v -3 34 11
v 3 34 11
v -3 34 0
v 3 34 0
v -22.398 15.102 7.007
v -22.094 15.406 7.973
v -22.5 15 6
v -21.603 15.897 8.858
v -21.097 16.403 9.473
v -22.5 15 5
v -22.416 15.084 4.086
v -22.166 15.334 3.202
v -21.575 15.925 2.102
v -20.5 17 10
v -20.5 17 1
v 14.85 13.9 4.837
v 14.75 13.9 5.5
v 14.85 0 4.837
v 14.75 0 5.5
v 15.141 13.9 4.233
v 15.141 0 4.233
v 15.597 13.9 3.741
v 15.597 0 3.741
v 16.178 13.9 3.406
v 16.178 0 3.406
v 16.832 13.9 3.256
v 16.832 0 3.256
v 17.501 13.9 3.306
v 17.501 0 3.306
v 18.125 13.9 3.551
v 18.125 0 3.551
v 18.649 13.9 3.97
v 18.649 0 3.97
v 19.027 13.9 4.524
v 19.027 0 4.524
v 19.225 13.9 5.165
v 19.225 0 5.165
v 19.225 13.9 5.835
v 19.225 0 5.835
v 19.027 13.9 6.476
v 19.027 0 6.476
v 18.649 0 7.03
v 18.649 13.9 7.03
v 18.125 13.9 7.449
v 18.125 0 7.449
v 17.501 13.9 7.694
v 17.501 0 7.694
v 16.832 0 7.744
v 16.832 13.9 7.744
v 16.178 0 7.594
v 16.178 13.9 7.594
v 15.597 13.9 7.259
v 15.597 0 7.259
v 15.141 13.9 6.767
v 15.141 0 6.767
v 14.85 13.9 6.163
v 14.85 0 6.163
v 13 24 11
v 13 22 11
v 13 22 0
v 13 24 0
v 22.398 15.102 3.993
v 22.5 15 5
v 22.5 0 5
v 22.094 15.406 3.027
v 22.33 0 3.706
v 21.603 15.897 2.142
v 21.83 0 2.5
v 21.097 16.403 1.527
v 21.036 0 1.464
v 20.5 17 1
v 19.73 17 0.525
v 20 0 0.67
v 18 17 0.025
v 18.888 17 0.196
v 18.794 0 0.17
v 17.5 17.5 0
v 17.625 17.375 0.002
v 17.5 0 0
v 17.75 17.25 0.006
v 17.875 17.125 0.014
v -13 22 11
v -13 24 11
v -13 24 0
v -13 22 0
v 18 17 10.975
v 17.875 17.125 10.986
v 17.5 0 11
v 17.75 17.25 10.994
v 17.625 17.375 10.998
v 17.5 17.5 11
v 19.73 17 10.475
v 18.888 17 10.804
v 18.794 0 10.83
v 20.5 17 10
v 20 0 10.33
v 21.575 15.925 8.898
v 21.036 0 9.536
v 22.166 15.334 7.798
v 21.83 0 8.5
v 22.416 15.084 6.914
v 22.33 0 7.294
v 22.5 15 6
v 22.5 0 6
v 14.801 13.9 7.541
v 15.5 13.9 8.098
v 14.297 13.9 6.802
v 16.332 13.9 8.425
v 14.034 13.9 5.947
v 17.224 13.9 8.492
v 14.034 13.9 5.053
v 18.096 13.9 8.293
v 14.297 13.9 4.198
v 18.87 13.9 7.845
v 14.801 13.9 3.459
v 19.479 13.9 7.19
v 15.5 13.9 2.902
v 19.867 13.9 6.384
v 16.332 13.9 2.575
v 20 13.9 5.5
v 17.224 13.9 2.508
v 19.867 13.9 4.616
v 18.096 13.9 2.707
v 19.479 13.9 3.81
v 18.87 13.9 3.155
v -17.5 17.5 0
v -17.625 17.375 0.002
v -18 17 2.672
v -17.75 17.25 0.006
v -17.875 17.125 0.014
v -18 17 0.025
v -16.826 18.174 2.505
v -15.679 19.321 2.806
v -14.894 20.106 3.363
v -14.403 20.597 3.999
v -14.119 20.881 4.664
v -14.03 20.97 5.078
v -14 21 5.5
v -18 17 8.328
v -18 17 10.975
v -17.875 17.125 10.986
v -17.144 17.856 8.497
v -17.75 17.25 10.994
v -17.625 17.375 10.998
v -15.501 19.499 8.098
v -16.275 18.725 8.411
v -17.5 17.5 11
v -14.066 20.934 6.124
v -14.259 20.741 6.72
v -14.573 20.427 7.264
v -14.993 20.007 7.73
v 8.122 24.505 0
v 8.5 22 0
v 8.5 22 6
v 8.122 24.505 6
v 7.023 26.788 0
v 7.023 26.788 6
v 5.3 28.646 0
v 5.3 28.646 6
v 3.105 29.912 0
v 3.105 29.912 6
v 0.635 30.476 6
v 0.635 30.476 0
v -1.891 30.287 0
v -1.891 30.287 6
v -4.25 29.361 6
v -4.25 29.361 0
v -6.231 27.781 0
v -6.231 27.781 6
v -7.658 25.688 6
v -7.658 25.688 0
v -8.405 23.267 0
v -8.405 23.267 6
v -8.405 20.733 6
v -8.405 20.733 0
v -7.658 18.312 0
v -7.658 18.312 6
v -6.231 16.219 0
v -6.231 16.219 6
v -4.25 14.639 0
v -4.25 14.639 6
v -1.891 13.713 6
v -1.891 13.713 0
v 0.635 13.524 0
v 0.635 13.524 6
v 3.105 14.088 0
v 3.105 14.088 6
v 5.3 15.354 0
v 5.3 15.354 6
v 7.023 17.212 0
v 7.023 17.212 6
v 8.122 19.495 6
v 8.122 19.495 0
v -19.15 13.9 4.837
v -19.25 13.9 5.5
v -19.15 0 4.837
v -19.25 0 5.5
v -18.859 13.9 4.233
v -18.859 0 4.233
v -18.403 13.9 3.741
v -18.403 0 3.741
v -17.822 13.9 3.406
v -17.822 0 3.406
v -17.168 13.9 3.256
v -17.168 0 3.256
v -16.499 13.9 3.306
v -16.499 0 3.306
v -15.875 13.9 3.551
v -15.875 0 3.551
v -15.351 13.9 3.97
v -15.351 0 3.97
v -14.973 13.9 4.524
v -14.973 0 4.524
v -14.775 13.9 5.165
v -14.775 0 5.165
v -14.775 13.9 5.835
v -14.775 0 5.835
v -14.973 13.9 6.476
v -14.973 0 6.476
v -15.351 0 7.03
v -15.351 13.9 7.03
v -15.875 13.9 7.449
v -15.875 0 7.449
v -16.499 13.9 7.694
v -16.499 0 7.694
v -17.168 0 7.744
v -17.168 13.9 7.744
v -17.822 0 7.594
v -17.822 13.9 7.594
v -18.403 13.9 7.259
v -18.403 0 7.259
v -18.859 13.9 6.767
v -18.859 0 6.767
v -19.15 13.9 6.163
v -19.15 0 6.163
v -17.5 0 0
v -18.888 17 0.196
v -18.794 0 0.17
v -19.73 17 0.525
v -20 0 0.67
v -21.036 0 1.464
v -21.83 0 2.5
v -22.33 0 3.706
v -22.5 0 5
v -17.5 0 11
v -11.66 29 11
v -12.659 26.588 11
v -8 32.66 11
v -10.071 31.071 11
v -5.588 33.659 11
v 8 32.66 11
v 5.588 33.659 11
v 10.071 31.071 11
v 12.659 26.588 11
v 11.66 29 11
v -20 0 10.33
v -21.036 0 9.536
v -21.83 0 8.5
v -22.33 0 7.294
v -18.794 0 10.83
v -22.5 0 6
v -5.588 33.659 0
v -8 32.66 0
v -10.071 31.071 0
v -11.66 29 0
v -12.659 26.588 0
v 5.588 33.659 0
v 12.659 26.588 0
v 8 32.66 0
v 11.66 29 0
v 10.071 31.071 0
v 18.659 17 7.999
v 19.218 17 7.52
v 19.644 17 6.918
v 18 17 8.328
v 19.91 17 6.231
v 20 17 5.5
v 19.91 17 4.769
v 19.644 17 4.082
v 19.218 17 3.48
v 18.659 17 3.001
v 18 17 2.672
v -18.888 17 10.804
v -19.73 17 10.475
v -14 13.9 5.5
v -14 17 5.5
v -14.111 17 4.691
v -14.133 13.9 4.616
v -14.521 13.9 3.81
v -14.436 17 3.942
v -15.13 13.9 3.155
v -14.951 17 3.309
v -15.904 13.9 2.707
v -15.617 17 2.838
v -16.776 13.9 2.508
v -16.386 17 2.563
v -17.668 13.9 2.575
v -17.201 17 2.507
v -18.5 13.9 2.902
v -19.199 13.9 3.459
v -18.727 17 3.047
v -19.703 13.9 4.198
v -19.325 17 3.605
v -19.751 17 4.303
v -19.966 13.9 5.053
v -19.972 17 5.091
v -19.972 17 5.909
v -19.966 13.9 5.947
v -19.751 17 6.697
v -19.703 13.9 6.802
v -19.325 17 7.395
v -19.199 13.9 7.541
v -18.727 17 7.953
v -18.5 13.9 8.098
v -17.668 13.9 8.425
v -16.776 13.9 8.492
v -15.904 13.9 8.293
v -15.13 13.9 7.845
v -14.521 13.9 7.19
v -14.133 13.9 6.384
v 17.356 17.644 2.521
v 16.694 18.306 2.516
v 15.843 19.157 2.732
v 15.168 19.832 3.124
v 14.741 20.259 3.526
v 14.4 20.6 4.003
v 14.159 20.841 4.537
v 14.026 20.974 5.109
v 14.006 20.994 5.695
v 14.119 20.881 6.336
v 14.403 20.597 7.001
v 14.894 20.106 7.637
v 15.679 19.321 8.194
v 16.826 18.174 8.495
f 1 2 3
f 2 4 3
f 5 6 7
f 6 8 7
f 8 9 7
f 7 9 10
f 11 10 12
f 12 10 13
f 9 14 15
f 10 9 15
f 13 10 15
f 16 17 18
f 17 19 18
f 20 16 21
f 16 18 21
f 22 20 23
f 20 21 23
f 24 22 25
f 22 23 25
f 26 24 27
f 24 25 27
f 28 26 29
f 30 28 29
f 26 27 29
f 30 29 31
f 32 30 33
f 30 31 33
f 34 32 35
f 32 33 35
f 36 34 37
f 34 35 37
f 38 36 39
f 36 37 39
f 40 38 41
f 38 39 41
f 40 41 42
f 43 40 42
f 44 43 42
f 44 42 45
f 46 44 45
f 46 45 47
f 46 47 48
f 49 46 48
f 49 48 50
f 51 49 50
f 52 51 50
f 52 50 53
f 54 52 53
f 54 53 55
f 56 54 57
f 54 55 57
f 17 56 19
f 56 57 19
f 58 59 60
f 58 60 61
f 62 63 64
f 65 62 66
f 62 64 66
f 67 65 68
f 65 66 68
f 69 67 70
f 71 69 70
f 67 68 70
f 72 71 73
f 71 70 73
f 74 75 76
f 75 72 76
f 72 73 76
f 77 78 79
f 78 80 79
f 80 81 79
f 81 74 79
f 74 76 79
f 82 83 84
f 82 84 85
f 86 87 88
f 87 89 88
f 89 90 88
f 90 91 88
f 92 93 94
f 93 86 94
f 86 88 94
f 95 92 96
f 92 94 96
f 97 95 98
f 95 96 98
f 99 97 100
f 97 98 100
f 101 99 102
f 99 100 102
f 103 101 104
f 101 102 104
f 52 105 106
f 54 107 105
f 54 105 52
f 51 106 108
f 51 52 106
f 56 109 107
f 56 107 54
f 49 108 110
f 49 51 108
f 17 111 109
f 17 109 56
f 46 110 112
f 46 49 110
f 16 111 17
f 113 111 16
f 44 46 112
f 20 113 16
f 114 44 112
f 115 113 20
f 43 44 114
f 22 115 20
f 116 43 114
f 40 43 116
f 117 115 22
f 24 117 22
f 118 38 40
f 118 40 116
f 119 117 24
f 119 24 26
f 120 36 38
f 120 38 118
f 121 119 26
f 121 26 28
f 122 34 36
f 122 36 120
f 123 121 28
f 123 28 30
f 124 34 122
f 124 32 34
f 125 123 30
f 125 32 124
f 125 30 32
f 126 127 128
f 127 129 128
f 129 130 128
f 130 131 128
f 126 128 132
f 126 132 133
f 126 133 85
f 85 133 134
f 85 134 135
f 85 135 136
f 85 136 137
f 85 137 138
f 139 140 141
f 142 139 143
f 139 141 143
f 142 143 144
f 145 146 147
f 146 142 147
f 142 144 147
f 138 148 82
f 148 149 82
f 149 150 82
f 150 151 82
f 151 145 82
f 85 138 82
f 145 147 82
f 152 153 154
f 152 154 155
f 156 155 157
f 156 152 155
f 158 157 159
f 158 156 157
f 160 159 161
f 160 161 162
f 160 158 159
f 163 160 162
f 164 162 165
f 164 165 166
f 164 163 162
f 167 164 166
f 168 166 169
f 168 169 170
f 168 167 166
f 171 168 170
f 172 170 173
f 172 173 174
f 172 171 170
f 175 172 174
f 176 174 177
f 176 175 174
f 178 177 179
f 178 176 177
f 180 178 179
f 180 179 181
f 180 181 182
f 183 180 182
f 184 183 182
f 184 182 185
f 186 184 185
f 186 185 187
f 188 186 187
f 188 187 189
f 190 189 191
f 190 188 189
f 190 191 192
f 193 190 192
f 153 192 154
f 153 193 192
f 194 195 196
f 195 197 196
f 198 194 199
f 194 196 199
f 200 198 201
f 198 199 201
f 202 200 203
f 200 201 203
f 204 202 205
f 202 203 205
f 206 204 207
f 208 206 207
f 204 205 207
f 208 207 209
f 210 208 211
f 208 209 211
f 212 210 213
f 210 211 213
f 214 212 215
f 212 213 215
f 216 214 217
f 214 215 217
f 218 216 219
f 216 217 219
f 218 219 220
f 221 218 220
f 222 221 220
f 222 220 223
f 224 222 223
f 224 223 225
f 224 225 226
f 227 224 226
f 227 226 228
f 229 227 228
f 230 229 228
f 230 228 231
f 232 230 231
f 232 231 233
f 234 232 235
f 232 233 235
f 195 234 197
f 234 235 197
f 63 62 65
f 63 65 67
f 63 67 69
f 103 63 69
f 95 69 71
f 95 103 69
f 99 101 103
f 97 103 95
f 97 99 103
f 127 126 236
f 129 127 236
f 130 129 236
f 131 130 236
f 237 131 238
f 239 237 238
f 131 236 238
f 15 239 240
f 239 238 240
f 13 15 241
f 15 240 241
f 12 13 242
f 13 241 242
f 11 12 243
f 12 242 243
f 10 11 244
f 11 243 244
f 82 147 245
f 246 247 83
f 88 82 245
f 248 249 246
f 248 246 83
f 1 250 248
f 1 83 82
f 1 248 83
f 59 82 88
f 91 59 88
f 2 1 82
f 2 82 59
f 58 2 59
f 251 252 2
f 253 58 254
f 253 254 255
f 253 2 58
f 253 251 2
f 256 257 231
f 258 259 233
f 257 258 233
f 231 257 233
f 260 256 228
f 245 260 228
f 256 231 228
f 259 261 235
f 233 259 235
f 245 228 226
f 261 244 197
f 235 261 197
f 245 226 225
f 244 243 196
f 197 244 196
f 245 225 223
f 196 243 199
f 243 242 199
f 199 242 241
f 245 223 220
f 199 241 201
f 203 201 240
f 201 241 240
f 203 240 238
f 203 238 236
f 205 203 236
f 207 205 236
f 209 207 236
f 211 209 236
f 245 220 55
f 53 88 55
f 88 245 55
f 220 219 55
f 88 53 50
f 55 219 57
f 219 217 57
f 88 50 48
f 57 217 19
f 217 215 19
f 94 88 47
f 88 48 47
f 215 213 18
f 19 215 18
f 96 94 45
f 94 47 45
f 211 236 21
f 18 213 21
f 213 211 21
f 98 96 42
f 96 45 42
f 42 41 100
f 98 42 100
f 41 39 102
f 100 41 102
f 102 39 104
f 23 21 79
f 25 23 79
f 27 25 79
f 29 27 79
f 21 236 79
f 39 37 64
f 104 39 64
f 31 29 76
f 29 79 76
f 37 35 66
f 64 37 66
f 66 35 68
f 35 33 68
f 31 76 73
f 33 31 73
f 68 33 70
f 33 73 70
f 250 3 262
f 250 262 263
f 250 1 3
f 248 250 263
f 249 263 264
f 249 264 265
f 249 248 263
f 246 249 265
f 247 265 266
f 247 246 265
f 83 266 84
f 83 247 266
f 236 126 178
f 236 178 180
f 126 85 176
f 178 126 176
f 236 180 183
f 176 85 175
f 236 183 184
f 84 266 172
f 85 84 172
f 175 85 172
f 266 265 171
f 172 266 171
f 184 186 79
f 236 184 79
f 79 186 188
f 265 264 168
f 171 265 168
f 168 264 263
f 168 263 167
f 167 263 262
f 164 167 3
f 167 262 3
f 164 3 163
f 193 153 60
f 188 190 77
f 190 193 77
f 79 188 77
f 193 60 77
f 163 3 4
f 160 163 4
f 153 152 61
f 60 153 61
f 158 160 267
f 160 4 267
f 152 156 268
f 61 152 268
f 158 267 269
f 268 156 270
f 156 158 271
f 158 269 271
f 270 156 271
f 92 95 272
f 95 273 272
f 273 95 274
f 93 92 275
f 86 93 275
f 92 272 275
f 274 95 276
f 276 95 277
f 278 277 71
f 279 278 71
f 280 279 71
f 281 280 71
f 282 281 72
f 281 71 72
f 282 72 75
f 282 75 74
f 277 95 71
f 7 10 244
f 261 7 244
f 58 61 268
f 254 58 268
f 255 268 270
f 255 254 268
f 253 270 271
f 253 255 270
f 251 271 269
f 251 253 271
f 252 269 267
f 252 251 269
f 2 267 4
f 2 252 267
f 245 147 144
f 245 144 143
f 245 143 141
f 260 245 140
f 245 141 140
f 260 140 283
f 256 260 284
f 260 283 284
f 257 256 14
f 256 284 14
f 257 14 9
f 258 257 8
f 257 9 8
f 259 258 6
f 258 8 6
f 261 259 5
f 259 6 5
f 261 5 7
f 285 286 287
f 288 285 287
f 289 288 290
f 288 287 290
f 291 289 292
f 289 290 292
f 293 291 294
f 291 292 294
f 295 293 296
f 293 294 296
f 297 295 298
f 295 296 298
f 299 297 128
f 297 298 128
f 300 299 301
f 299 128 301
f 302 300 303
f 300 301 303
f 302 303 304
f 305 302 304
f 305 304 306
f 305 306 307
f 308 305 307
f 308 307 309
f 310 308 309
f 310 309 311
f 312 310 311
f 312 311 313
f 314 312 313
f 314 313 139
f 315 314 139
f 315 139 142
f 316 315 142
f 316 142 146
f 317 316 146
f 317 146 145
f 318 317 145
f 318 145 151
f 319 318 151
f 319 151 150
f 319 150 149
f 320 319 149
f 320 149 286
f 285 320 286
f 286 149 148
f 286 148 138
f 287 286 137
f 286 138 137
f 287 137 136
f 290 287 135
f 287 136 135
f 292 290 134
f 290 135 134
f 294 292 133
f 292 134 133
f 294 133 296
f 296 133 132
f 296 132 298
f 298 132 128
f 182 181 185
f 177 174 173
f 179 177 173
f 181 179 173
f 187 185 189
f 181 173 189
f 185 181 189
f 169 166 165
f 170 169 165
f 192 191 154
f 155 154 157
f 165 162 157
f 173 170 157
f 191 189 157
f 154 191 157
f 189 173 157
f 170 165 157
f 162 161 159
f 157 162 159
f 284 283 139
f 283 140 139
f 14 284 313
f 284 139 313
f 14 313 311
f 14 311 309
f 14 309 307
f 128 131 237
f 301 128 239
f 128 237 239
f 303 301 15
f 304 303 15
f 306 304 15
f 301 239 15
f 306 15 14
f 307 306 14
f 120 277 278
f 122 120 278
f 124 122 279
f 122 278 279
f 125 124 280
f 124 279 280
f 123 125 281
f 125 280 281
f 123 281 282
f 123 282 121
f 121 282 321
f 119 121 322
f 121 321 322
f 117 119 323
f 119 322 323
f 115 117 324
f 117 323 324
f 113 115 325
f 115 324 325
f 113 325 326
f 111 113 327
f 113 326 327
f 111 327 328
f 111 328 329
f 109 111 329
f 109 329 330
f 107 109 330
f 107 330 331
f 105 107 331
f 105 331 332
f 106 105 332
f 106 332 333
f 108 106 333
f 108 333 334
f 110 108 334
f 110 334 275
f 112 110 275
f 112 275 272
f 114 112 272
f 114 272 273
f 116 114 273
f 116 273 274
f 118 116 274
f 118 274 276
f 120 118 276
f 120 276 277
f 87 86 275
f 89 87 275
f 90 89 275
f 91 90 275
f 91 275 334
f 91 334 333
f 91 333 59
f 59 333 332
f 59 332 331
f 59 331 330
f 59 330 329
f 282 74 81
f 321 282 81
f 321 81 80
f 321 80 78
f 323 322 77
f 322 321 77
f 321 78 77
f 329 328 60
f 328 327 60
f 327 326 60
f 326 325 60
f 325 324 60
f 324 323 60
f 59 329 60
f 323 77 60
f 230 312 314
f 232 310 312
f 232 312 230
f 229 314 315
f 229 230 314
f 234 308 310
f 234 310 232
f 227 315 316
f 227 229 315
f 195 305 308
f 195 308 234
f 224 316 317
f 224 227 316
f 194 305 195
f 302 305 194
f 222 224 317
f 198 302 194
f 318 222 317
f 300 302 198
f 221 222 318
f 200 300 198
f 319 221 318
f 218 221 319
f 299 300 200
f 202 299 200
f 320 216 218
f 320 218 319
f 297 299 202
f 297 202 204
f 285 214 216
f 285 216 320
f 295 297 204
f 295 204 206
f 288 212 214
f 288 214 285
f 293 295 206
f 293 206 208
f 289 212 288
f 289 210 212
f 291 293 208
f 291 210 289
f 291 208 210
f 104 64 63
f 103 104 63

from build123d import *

# Parameters (mm, degrees)
CROQUIS1_R                                           = 8.5
SALIENTE_EXTRUIR1_DEPTH                              = 6
SALIENTE_EXTRUIR2_DEPTH                              = 5
REFRENTADO_PARA_TORNILLO_CON_CABEZA_TRON_D           = 4.5
REFRENTADO_PARA_TORNILLO_CON_CABEZA_TRON_CBORE_D     = 6
REFRENTADO_PARA_TORNILLO_CON_CABEZA_TRON_CBORE_DEPTH = 3.1
CHAFL_N1_SIZE                                        = 5
REDONDEO1_R                                          = 10
CHAFL_N2_SIZE                                        = 2
REDONDEO2_R                                          = 5
REDONDEO3_R                                          = 5
REDONDEO4_R                                          = 5
REDONDEO5_R                                          = 5


with BuildPart() as part:
    # Croquis1 → Saliente-Extruir1 (new body)
    with BuildSketch(Plane.XY):
        Polygon((-22.5, 0), (22.5, 0), (22.5, 17), (13, 17), (13, 34), (-13, 34), (-13, 17), (-22.5, 17), align=None)
        with Locations((0, 22)):
            Circle(CROQUIS1_R, mode=Mode.SUBTRACT)
    extrude(amount=SALIENTE_EXTRUIR1_DEPTH)

    # Croquis2 → Saliente-Extruir2 (add)
    with BuildSketch(Plane.XY.offset(6)):
        Polygon((22.5, 0), (22.5, 17), (13, 17), (13, 34), (-13, 34), (-13, 17), (-22.5, 17), (-22.5, 0), align=None)
    extrude(amount=SALIENTE_EXTRUIR2_DEPTH)

    # Refrentado para tornillo con cabeza troncocónica de M41 (through all)
    with Locations(Plane(origin=(17, 17, 5.5), x_dir=(1, 0, 0), z_dir=(0, 1, 0))):
        with Locations((0, 0), (-34, 0)):
            CounterBoreHole(REFRENTADO_PARA_TORNILLO_CON_CABEZA_TRON_D / 2, REFRENTADO_PARA_TORNILLO_CON_CABEZA_TRON_CBORE_D / 2, REFRENTADO_PARA_TORNILLO_CON_CABEZA_TRON_CBORE_DEPTH)

    # Chaflán1
    # the kernel refuses this chamfer: 5 mm, written as the material it adds along each edge
    with BuildSketch(Plane(origin=(-13, 17, 11), x_dir=(-0.9996219169112968, -0.02749587661058561, 0), z_dir=(0, 0, -1))) as chafl_n1_piece_1_section:
        Polygon((CHAFL_N1_SIZE * 0.999621916911, CHAFL_N1_SIZE * 0.0274958766106), (-CHAFL_N1_SIZE * 0.0274958766106, CHAFL_N1_SIZE * 0.999621916911), (0, 0), align=None)
    chafl_n1_piece_1 = extrude(amount=11, mode=Mode.PRIVATE)
    chafl_n1_piece_1 = chafl_n1_piece_1 - Plane(origin=(-17, 17.70483049, 5.5), x_dir=(1, 0, 0), z_dir=(0, 1, 0)) * Cylinder(3, 42, mode=Mode.PRIVATE)
    add(chafl_n1_piece_1)
    with BuildSketch(Plane(origin=(13, 17, 0), x_dir=(0.9996219169112968, -0.027495876610585626, 0), z_dir=(0, 0, 1))) as chafl_n1_piece_2_section:
        Polygon((CHAFL_N1_SIZE * 0.999621916911, CHAFL_N1_SIZE * 0.0274958766106), (-CHAFL_N1_SIZE * 0.0274958766106, CHAFL_N1_SIZE * 0.999621916911), (0, 0), align=None)
    chafl_n1_piece_2 = extrude(amount=11, mode=Mode.PRIVATE)
    chafl_n1_piece_2 = chafl_n1_piece_2 - Plane(origin=(17, 17.70483049, 5.5), x_dir=(1, 0, 0), z_dir=(0, 1, 0)) * Cylinder(3, 42, mode=Mode.PRIVATE)
    add(chafl_n1_piece_2)

    # Redondeo1
    redondeo1_edges = [part.edges().sort_by_distance(p)[0] for p in [
        (-13, 34, 5.5),
        (13, 34, 5.5),
    ]]
    fillet(redondeo1_edges, radius=REDONDEO1_R)

    # Chaflán2
    chafl_n2_edges = [part.edges().sort_by_distance(p)[0] for p in [
        (-22.5, 17, 5.5),
        (22.5, 17, 5.5),
    ]]
    chamfer(chafl_n2_edges, length=CHAFL_N2_SIZE)

    # Redondeo2
    # the kernel refuses this fillet: 5 mm, written as the material it takes off along each edge
    with BuildSketch(Plane(origin=(22.5, -12.5, 11), x_dir=(0, 0, -1), z_dir=(0, 1, 0))) as redondeo2_piece_1:
        with BuildLine():
            CenterArc((REDONDEO2_R, REDONDEO2_R), REDONDEO2_R, 180, 90)
            Line((0, REDONDEO2_R), (0, 0))
            Line((0, 0), (REDONDEO2_R, 0))
        make_face()
    extrude(amount=40, mode=Mode.SUBTRACT)

    # Redondeo3
    redondeo3_edges = [part.edges().sort_by_distance(p)[0] for p in [
        (-22.5, 7.5, 0),
    ]]
    fillet(redondeo3_edges, radius=REDONDEO3_R)

    # Redondeo4
    # the kernel refuses this fillet: 5 mm, written as the material it takes off along each edge
    with BuildSketch(Plane(origin=(22.5, -12.5, 0), x_dir=(-1, 0, 0), z_dir=(0, 1, 0))) as redondeo4_piece_1:
        with BuildLine():
            CenterArc((REDONDEO4_R, REDONDEO4_R), REDONDEO4_R, 180, 90)
            Line((0, REDONDEO4_R), (0, 0))
            Line((0, 0), (REDONDEO4_R, 0))
        make_face()
    extrude(amount=40, mode=Mode.SUBTRACT)

    # Redondeo5
    # the kernel refuses this fillet: 5 mm, written as the material it takes off along each edge
    with BuildSketch(Plane(origin=(-22.5, 27.5, 11), x_dir=(0, 0, -1), z_dir=(0, -1, 0))) as redondeo5_piece_1:
        with BuildLine():
            CenterArc((REDONDEO5_R, REDONDEO5_R), REDONDEO5_R, 180, 90)
            Line((0, REDONDEO5_R), (0, 0))
            Line((0, 0), (REDONDEO5_R, 0))
        make_face()
    extrude(amount=40, mode=Mode.SUBTRACT)


solid = part.part
